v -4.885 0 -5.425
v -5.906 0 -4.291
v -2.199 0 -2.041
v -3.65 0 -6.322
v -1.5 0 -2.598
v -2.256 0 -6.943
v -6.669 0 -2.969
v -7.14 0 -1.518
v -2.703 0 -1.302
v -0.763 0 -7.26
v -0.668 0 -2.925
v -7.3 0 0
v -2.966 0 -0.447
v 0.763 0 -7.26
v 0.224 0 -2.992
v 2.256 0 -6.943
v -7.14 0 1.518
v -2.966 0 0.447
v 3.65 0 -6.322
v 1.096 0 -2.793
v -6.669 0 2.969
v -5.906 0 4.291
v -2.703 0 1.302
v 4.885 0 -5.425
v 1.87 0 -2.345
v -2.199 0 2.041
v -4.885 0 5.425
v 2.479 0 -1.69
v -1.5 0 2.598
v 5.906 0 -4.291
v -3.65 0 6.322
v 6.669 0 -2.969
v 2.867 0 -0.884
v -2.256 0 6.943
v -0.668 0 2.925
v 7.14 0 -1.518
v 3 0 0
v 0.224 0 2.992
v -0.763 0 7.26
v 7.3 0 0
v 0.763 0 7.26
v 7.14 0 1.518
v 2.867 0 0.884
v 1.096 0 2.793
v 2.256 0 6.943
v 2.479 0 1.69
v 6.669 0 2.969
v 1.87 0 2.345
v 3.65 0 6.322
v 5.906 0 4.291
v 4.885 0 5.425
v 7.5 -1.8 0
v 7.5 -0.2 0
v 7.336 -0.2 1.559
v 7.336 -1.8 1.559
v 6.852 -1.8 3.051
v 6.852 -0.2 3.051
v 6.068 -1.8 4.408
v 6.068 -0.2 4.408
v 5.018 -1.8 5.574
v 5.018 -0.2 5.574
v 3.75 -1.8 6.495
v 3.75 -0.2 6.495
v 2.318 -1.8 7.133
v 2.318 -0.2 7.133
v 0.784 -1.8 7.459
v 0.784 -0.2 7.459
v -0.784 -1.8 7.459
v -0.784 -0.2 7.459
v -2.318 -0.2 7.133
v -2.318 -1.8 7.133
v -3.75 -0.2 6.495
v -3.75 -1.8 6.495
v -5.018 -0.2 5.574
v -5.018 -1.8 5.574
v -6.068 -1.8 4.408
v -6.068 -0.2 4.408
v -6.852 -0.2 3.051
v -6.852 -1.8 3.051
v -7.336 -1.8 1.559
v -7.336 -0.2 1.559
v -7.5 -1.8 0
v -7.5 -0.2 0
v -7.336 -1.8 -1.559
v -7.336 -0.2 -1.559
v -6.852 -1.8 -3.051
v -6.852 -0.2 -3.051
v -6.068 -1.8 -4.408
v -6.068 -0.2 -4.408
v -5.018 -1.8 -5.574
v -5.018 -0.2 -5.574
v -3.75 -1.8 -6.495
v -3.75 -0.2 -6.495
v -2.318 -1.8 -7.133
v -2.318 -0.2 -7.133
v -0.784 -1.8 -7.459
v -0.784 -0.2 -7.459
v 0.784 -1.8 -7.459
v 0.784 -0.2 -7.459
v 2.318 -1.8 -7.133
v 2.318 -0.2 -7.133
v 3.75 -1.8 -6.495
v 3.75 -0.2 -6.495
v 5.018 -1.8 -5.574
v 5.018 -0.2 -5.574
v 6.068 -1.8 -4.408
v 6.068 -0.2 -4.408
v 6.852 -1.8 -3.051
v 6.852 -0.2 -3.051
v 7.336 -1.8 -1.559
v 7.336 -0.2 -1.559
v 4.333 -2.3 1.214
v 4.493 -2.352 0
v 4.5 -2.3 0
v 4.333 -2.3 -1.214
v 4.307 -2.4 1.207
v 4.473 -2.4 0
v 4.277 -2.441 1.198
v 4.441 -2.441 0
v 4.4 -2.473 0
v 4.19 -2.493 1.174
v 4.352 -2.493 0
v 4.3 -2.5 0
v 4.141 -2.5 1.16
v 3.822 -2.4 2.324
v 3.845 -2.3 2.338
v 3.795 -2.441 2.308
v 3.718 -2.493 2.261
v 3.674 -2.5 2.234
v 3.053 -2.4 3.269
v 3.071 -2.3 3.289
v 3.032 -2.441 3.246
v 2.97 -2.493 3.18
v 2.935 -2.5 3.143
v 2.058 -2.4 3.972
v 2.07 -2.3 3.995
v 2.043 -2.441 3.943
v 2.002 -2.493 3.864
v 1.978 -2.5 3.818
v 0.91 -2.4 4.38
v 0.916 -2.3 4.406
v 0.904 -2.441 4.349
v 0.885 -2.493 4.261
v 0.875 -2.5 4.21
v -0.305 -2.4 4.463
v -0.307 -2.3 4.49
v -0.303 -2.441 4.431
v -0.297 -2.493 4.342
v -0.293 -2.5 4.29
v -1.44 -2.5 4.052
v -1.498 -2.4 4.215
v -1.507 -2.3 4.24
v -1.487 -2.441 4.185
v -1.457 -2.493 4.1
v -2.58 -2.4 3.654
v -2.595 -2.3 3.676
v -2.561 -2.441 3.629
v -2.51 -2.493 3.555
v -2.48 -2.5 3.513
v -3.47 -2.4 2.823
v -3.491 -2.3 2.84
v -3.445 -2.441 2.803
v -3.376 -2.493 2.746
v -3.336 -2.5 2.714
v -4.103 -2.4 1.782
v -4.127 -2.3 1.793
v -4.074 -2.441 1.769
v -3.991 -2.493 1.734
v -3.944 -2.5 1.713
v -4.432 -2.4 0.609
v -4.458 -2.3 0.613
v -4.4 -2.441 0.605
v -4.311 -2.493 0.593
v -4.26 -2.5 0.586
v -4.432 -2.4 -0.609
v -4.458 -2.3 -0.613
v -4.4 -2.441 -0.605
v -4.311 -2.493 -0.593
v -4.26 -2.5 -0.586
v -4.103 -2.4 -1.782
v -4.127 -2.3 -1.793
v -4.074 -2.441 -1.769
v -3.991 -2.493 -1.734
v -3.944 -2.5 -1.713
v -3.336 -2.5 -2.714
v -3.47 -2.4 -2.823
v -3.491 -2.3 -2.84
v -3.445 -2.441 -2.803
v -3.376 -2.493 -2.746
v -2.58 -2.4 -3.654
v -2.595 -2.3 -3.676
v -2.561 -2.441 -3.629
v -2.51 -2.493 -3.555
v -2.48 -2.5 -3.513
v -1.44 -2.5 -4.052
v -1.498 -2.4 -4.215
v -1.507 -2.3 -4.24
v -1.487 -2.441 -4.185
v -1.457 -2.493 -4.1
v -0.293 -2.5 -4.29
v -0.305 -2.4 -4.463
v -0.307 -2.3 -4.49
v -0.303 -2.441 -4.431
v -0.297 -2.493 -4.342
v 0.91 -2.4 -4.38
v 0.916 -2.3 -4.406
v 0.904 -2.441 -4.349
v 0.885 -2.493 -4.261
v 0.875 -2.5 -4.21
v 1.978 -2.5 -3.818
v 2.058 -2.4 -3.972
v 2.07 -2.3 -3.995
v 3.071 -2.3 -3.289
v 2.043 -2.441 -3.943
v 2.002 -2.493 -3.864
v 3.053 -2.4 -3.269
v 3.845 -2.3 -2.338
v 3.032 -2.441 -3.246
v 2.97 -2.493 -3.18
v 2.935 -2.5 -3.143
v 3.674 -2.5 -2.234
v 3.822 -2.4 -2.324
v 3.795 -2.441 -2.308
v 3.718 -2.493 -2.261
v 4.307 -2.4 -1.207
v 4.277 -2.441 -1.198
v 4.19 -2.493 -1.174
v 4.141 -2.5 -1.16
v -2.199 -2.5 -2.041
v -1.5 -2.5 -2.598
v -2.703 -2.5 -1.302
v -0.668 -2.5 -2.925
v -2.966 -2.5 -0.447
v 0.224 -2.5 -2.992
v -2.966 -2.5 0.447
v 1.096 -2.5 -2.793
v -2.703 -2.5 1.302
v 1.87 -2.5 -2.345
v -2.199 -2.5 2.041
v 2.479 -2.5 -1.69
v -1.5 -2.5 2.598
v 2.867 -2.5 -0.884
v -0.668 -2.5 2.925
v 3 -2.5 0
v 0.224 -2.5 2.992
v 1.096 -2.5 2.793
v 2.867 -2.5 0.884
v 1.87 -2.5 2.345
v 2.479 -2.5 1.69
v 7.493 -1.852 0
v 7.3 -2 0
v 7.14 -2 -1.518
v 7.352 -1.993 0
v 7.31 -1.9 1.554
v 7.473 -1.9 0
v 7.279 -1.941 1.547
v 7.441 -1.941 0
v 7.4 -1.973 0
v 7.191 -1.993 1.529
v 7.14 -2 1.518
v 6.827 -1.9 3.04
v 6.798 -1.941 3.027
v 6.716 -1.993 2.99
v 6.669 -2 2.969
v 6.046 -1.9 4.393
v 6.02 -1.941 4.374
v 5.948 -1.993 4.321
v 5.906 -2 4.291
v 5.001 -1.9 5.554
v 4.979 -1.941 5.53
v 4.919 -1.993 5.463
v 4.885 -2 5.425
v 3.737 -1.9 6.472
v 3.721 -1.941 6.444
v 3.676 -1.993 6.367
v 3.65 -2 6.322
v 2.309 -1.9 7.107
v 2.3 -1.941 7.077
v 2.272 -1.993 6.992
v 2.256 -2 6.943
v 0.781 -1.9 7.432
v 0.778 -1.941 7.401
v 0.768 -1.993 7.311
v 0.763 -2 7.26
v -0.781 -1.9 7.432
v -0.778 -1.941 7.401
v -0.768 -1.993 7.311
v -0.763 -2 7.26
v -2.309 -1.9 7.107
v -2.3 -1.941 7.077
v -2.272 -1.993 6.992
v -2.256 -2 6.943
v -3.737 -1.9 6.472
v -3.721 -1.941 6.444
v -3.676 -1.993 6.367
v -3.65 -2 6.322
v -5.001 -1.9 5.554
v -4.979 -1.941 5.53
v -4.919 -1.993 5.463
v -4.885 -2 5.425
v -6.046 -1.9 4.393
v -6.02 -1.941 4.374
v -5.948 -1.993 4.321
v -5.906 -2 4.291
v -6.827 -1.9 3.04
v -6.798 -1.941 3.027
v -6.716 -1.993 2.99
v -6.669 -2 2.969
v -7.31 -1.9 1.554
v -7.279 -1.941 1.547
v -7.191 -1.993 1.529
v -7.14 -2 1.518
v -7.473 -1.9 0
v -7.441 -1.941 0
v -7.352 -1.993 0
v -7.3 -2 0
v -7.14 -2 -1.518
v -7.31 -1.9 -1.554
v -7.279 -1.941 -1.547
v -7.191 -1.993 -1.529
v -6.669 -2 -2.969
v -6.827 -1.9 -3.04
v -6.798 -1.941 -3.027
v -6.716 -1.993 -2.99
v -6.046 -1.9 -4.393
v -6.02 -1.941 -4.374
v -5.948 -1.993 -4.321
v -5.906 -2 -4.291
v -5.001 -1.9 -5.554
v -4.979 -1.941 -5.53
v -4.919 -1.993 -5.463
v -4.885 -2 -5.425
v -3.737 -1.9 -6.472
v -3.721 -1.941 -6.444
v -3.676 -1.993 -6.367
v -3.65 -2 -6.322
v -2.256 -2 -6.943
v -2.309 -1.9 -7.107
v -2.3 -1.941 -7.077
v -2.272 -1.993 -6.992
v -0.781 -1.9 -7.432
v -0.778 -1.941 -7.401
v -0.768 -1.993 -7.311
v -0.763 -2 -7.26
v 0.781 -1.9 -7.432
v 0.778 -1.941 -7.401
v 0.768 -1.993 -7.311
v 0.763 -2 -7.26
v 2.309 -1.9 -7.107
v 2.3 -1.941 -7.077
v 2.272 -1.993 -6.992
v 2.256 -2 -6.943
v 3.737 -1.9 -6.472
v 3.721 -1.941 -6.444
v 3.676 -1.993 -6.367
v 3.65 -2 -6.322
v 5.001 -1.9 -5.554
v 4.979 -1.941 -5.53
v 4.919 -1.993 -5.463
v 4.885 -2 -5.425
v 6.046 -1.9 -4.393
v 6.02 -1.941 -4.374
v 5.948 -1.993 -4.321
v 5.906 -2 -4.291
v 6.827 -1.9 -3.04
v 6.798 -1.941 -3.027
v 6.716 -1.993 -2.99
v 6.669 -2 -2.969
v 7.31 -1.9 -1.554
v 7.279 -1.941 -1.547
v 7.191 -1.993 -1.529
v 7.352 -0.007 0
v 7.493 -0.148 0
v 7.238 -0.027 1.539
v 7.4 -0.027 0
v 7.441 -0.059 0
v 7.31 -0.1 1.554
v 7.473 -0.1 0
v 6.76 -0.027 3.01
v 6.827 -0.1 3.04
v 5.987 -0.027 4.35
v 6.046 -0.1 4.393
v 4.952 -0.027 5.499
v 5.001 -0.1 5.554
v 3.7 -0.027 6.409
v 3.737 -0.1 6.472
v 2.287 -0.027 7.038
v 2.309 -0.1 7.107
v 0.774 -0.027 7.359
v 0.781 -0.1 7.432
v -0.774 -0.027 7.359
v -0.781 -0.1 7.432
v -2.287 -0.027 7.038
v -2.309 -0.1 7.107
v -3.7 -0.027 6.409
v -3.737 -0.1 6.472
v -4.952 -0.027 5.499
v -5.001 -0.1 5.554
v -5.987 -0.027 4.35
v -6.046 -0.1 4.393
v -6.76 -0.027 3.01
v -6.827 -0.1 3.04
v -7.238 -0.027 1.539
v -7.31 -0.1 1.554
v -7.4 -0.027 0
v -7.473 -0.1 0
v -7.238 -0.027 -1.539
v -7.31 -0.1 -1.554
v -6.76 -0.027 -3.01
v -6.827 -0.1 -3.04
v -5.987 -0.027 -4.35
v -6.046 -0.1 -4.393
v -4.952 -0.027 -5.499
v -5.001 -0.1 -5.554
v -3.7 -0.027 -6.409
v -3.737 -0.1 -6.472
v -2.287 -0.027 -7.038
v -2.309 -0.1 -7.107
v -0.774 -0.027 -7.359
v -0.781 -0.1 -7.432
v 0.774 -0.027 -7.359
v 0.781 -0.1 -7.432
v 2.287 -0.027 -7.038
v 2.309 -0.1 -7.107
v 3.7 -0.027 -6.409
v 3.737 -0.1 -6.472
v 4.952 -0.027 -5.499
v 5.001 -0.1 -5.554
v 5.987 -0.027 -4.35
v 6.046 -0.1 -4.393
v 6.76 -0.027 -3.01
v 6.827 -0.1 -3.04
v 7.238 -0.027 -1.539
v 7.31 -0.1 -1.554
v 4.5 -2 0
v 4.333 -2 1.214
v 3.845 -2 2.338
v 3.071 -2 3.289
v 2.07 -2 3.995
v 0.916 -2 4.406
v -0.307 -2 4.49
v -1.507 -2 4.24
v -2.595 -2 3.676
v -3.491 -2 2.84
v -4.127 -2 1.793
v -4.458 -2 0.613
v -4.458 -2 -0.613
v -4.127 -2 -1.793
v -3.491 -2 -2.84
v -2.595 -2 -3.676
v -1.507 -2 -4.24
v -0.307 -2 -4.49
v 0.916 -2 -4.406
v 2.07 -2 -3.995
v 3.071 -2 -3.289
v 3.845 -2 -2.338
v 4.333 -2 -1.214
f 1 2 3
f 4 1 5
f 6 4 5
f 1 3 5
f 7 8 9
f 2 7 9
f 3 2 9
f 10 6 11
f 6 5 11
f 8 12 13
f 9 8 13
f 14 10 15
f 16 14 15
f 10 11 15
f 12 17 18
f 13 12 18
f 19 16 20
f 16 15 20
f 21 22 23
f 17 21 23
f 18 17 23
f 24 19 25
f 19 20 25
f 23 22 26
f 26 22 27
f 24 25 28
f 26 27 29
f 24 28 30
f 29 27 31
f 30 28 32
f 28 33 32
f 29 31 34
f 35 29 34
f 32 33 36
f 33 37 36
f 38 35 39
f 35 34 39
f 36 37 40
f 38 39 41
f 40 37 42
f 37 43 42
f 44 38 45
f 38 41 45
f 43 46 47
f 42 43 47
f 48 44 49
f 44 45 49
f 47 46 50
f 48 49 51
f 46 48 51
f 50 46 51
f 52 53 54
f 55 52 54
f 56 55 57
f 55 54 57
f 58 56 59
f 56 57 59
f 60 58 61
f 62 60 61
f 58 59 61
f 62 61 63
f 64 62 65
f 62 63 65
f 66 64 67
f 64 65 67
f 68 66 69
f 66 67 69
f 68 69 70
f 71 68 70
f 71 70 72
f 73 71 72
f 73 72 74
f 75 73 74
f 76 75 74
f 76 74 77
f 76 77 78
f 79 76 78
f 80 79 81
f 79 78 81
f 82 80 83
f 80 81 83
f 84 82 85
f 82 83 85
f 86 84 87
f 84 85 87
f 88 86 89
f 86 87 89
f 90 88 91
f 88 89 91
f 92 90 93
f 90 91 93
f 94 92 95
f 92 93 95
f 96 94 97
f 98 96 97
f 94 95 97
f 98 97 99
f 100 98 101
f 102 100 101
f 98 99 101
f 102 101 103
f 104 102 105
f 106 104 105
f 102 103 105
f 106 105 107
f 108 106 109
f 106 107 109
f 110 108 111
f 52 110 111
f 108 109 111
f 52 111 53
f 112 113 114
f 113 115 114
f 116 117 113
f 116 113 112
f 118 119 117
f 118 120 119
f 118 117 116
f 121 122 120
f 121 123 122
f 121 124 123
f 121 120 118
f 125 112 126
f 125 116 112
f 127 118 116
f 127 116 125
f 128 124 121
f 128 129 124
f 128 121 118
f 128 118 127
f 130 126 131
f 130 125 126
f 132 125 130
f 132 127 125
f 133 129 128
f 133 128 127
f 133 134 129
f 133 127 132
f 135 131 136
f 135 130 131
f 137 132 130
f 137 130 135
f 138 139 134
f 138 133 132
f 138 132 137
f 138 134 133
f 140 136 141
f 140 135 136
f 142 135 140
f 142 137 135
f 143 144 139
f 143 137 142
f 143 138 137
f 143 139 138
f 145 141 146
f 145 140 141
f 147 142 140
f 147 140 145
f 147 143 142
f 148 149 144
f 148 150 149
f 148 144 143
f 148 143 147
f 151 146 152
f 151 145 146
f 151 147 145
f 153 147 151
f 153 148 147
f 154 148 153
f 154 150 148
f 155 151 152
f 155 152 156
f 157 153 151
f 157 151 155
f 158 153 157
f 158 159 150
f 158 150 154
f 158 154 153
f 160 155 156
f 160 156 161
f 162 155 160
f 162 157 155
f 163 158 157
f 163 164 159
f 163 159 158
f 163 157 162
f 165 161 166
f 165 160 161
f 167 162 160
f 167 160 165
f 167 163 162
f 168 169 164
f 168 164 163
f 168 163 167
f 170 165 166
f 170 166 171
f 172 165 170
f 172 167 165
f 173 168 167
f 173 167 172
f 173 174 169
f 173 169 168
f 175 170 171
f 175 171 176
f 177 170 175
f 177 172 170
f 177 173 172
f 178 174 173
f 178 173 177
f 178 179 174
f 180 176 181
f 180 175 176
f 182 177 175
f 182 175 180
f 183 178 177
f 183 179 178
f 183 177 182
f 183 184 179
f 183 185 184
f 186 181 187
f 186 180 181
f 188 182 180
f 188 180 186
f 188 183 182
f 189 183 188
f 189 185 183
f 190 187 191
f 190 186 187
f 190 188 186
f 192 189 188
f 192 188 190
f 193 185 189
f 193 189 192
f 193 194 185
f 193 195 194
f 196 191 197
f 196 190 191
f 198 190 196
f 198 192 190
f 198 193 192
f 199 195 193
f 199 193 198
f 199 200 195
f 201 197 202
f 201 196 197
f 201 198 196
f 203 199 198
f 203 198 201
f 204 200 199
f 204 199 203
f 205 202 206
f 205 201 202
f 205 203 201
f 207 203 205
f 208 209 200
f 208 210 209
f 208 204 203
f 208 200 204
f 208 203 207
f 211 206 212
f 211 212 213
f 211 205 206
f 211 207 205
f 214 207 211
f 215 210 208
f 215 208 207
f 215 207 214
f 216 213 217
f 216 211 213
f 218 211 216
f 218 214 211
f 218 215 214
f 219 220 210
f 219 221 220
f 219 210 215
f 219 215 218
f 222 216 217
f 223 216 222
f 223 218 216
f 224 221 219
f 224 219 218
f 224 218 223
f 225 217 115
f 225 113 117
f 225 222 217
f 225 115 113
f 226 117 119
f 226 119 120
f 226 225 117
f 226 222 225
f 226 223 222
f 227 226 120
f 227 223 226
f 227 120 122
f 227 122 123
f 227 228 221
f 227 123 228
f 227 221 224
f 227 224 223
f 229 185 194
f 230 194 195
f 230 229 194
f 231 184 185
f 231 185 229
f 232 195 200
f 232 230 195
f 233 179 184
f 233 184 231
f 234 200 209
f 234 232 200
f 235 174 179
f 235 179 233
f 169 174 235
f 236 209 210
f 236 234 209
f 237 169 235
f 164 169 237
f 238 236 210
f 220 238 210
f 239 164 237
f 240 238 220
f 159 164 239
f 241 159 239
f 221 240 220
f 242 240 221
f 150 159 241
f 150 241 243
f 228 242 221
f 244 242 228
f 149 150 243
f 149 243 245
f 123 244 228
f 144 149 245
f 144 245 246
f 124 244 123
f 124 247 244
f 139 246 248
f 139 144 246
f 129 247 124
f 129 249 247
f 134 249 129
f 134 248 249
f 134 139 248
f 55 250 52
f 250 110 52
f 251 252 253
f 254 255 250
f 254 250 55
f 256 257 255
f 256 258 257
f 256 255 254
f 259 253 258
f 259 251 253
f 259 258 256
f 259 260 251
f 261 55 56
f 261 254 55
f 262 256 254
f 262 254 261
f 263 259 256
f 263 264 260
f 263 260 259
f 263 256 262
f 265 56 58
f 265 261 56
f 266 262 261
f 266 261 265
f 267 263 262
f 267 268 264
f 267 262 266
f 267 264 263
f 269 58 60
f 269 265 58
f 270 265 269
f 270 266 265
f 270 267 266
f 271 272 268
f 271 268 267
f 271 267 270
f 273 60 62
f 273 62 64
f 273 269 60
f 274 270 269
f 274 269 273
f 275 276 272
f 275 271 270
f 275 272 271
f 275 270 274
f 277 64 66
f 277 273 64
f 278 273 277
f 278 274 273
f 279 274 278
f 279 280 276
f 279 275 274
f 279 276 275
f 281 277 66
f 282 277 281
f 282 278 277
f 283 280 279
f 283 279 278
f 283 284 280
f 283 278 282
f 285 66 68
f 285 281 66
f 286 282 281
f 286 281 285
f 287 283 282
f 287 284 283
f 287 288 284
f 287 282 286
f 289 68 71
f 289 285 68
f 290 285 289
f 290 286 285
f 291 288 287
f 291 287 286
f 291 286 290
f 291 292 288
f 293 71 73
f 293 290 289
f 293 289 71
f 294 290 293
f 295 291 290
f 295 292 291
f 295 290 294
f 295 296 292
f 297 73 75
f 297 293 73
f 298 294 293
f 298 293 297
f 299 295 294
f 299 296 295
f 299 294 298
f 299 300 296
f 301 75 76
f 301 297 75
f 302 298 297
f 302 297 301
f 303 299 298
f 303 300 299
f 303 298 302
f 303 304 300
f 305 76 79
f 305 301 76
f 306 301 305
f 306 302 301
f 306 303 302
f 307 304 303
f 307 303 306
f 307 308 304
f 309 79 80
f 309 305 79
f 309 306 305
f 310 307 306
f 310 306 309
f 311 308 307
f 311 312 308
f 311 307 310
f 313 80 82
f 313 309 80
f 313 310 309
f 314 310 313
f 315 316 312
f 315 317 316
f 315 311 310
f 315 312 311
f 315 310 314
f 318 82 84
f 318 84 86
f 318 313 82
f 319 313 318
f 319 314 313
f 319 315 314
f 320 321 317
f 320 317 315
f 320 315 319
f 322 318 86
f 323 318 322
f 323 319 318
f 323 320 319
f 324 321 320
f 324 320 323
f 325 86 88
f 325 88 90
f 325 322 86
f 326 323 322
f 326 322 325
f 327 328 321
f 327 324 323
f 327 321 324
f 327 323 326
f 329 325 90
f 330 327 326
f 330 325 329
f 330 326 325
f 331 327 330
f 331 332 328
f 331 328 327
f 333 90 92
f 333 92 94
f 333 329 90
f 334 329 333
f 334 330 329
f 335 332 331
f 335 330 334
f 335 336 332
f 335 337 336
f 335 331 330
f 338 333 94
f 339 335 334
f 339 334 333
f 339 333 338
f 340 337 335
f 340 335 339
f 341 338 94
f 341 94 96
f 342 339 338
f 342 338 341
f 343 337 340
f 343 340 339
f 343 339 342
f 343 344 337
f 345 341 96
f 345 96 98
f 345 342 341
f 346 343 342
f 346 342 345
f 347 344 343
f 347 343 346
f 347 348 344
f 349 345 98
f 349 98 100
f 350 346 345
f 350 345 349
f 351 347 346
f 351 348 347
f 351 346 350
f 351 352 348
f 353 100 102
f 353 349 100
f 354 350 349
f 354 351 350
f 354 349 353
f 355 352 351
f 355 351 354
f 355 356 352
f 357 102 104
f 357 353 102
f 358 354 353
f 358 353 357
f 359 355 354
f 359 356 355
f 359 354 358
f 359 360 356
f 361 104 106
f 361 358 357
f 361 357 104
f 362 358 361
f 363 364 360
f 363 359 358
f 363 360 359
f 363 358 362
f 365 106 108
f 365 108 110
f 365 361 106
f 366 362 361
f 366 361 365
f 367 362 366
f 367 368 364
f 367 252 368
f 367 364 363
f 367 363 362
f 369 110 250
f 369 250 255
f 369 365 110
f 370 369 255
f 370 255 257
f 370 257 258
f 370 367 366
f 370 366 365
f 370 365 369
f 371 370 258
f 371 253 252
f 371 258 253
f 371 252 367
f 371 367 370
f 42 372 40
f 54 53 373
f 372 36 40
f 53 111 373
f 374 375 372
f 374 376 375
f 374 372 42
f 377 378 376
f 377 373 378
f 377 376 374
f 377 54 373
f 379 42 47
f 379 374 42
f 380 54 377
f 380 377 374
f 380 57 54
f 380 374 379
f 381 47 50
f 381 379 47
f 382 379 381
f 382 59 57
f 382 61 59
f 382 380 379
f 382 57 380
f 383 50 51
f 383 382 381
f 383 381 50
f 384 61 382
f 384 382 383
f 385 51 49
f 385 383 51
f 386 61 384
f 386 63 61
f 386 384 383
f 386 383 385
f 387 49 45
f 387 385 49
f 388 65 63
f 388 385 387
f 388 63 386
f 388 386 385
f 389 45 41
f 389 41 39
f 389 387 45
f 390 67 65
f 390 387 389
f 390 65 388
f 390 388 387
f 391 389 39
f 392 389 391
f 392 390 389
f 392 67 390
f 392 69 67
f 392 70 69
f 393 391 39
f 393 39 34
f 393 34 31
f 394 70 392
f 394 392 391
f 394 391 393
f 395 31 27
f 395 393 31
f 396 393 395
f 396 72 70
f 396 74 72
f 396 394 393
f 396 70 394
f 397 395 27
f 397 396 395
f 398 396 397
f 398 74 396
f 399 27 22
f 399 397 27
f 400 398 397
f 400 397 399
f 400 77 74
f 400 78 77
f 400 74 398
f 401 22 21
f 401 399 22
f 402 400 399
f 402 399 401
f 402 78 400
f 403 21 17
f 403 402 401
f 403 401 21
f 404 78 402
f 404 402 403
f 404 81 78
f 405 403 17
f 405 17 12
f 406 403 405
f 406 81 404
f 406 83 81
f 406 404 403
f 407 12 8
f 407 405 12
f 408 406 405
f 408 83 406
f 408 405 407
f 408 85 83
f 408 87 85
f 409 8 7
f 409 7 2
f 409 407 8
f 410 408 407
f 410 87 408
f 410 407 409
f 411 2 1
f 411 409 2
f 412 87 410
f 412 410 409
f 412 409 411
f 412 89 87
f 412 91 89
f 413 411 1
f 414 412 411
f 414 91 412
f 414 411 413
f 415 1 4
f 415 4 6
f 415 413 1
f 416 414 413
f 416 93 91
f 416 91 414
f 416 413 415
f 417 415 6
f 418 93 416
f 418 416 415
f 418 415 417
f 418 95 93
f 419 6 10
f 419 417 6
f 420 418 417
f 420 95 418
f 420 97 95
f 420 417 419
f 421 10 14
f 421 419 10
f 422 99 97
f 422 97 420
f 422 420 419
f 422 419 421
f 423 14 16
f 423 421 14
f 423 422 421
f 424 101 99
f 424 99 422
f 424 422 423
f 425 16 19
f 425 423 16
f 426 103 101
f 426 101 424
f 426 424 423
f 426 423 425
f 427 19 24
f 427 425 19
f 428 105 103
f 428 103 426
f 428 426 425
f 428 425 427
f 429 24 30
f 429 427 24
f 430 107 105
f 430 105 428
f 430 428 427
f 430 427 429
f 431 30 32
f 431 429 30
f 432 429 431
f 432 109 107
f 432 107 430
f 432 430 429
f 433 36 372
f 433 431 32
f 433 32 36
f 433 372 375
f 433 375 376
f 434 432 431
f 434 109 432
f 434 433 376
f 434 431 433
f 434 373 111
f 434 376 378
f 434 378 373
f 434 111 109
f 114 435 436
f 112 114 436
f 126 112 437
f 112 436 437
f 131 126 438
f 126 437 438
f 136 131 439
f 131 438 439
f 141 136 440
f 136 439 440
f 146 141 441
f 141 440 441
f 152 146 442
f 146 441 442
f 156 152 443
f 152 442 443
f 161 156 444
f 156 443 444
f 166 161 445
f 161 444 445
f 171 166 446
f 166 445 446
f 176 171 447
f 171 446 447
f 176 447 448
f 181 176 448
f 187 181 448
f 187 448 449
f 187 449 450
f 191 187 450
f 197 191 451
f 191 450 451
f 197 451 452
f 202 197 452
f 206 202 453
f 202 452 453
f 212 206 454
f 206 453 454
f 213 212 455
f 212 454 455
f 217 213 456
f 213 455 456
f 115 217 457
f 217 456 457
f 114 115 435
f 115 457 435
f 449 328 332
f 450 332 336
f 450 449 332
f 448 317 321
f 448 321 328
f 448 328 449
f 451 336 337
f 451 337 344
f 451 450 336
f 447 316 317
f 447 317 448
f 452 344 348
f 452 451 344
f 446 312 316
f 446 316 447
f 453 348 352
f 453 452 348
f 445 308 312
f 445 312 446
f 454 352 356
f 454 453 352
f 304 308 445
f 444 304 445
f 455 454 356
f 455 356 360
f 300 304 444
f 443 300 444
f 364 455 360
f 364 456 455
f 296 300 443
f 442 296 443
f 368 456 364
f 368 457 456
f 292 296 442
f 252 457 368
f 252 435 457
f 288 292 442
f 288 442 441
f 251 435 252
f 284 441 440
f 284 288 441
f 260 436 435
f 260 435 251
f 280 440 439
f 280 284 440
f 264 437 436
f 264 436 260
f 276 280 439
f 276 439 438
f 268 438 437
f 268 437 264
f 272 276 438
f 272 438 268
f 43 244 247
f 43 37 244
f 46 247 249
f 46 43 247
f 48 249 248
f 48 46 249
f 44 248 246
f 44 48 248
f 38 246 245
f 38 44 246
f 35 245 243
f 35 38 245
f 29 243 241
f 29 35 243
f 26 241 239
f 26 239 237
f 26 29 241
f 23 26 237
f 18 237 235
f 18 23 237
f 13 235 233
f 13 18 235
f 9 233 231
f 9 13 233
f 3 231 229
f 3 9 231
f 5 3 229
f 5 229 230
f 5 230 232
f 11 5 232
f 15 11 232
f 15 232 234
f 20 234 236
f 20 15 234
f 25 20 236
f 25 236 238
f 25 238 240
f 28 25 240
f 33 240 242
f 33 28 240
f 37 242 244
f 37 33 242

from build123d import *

# Parameters (mm, degrees)
F0_R     = 7.5
F0_R_2   = 3
F1_DEPTH = 2
F2_R     = 4.5
F2_R_2   = 3
F3_DEPTH = 0.5
F4_R     = 0.2


with BuildPart() as f1:
    # F0 (on Front) → F1 (new body)
    with BuildSketch(Plane.XZ):
        Circle(F0_R)
        Circle(F0_R_2, mode=Mode.SUBTRACT)
    extrude(amount=F1_DEPTH)

    # F2 (on face) → F3 (join)
    with BuildSketch(Plane.XZ.offset(2)):
        Circle(F2_R)
        Circle(F2_R_2, mode=Mode.SUBTRACT)
    extrude(amount=F3_DEPTH)

    # F4
    f4_edges = [f1.edges().sort_by_distance(p)[0] for p in [
        (-7.5, -2, 0),
        (-7.5, 0, 0),
        (-4.5, -2.5, 0),
    ]]
    fillet(f4_edges, radius=F4_R)


solid = f1.part
